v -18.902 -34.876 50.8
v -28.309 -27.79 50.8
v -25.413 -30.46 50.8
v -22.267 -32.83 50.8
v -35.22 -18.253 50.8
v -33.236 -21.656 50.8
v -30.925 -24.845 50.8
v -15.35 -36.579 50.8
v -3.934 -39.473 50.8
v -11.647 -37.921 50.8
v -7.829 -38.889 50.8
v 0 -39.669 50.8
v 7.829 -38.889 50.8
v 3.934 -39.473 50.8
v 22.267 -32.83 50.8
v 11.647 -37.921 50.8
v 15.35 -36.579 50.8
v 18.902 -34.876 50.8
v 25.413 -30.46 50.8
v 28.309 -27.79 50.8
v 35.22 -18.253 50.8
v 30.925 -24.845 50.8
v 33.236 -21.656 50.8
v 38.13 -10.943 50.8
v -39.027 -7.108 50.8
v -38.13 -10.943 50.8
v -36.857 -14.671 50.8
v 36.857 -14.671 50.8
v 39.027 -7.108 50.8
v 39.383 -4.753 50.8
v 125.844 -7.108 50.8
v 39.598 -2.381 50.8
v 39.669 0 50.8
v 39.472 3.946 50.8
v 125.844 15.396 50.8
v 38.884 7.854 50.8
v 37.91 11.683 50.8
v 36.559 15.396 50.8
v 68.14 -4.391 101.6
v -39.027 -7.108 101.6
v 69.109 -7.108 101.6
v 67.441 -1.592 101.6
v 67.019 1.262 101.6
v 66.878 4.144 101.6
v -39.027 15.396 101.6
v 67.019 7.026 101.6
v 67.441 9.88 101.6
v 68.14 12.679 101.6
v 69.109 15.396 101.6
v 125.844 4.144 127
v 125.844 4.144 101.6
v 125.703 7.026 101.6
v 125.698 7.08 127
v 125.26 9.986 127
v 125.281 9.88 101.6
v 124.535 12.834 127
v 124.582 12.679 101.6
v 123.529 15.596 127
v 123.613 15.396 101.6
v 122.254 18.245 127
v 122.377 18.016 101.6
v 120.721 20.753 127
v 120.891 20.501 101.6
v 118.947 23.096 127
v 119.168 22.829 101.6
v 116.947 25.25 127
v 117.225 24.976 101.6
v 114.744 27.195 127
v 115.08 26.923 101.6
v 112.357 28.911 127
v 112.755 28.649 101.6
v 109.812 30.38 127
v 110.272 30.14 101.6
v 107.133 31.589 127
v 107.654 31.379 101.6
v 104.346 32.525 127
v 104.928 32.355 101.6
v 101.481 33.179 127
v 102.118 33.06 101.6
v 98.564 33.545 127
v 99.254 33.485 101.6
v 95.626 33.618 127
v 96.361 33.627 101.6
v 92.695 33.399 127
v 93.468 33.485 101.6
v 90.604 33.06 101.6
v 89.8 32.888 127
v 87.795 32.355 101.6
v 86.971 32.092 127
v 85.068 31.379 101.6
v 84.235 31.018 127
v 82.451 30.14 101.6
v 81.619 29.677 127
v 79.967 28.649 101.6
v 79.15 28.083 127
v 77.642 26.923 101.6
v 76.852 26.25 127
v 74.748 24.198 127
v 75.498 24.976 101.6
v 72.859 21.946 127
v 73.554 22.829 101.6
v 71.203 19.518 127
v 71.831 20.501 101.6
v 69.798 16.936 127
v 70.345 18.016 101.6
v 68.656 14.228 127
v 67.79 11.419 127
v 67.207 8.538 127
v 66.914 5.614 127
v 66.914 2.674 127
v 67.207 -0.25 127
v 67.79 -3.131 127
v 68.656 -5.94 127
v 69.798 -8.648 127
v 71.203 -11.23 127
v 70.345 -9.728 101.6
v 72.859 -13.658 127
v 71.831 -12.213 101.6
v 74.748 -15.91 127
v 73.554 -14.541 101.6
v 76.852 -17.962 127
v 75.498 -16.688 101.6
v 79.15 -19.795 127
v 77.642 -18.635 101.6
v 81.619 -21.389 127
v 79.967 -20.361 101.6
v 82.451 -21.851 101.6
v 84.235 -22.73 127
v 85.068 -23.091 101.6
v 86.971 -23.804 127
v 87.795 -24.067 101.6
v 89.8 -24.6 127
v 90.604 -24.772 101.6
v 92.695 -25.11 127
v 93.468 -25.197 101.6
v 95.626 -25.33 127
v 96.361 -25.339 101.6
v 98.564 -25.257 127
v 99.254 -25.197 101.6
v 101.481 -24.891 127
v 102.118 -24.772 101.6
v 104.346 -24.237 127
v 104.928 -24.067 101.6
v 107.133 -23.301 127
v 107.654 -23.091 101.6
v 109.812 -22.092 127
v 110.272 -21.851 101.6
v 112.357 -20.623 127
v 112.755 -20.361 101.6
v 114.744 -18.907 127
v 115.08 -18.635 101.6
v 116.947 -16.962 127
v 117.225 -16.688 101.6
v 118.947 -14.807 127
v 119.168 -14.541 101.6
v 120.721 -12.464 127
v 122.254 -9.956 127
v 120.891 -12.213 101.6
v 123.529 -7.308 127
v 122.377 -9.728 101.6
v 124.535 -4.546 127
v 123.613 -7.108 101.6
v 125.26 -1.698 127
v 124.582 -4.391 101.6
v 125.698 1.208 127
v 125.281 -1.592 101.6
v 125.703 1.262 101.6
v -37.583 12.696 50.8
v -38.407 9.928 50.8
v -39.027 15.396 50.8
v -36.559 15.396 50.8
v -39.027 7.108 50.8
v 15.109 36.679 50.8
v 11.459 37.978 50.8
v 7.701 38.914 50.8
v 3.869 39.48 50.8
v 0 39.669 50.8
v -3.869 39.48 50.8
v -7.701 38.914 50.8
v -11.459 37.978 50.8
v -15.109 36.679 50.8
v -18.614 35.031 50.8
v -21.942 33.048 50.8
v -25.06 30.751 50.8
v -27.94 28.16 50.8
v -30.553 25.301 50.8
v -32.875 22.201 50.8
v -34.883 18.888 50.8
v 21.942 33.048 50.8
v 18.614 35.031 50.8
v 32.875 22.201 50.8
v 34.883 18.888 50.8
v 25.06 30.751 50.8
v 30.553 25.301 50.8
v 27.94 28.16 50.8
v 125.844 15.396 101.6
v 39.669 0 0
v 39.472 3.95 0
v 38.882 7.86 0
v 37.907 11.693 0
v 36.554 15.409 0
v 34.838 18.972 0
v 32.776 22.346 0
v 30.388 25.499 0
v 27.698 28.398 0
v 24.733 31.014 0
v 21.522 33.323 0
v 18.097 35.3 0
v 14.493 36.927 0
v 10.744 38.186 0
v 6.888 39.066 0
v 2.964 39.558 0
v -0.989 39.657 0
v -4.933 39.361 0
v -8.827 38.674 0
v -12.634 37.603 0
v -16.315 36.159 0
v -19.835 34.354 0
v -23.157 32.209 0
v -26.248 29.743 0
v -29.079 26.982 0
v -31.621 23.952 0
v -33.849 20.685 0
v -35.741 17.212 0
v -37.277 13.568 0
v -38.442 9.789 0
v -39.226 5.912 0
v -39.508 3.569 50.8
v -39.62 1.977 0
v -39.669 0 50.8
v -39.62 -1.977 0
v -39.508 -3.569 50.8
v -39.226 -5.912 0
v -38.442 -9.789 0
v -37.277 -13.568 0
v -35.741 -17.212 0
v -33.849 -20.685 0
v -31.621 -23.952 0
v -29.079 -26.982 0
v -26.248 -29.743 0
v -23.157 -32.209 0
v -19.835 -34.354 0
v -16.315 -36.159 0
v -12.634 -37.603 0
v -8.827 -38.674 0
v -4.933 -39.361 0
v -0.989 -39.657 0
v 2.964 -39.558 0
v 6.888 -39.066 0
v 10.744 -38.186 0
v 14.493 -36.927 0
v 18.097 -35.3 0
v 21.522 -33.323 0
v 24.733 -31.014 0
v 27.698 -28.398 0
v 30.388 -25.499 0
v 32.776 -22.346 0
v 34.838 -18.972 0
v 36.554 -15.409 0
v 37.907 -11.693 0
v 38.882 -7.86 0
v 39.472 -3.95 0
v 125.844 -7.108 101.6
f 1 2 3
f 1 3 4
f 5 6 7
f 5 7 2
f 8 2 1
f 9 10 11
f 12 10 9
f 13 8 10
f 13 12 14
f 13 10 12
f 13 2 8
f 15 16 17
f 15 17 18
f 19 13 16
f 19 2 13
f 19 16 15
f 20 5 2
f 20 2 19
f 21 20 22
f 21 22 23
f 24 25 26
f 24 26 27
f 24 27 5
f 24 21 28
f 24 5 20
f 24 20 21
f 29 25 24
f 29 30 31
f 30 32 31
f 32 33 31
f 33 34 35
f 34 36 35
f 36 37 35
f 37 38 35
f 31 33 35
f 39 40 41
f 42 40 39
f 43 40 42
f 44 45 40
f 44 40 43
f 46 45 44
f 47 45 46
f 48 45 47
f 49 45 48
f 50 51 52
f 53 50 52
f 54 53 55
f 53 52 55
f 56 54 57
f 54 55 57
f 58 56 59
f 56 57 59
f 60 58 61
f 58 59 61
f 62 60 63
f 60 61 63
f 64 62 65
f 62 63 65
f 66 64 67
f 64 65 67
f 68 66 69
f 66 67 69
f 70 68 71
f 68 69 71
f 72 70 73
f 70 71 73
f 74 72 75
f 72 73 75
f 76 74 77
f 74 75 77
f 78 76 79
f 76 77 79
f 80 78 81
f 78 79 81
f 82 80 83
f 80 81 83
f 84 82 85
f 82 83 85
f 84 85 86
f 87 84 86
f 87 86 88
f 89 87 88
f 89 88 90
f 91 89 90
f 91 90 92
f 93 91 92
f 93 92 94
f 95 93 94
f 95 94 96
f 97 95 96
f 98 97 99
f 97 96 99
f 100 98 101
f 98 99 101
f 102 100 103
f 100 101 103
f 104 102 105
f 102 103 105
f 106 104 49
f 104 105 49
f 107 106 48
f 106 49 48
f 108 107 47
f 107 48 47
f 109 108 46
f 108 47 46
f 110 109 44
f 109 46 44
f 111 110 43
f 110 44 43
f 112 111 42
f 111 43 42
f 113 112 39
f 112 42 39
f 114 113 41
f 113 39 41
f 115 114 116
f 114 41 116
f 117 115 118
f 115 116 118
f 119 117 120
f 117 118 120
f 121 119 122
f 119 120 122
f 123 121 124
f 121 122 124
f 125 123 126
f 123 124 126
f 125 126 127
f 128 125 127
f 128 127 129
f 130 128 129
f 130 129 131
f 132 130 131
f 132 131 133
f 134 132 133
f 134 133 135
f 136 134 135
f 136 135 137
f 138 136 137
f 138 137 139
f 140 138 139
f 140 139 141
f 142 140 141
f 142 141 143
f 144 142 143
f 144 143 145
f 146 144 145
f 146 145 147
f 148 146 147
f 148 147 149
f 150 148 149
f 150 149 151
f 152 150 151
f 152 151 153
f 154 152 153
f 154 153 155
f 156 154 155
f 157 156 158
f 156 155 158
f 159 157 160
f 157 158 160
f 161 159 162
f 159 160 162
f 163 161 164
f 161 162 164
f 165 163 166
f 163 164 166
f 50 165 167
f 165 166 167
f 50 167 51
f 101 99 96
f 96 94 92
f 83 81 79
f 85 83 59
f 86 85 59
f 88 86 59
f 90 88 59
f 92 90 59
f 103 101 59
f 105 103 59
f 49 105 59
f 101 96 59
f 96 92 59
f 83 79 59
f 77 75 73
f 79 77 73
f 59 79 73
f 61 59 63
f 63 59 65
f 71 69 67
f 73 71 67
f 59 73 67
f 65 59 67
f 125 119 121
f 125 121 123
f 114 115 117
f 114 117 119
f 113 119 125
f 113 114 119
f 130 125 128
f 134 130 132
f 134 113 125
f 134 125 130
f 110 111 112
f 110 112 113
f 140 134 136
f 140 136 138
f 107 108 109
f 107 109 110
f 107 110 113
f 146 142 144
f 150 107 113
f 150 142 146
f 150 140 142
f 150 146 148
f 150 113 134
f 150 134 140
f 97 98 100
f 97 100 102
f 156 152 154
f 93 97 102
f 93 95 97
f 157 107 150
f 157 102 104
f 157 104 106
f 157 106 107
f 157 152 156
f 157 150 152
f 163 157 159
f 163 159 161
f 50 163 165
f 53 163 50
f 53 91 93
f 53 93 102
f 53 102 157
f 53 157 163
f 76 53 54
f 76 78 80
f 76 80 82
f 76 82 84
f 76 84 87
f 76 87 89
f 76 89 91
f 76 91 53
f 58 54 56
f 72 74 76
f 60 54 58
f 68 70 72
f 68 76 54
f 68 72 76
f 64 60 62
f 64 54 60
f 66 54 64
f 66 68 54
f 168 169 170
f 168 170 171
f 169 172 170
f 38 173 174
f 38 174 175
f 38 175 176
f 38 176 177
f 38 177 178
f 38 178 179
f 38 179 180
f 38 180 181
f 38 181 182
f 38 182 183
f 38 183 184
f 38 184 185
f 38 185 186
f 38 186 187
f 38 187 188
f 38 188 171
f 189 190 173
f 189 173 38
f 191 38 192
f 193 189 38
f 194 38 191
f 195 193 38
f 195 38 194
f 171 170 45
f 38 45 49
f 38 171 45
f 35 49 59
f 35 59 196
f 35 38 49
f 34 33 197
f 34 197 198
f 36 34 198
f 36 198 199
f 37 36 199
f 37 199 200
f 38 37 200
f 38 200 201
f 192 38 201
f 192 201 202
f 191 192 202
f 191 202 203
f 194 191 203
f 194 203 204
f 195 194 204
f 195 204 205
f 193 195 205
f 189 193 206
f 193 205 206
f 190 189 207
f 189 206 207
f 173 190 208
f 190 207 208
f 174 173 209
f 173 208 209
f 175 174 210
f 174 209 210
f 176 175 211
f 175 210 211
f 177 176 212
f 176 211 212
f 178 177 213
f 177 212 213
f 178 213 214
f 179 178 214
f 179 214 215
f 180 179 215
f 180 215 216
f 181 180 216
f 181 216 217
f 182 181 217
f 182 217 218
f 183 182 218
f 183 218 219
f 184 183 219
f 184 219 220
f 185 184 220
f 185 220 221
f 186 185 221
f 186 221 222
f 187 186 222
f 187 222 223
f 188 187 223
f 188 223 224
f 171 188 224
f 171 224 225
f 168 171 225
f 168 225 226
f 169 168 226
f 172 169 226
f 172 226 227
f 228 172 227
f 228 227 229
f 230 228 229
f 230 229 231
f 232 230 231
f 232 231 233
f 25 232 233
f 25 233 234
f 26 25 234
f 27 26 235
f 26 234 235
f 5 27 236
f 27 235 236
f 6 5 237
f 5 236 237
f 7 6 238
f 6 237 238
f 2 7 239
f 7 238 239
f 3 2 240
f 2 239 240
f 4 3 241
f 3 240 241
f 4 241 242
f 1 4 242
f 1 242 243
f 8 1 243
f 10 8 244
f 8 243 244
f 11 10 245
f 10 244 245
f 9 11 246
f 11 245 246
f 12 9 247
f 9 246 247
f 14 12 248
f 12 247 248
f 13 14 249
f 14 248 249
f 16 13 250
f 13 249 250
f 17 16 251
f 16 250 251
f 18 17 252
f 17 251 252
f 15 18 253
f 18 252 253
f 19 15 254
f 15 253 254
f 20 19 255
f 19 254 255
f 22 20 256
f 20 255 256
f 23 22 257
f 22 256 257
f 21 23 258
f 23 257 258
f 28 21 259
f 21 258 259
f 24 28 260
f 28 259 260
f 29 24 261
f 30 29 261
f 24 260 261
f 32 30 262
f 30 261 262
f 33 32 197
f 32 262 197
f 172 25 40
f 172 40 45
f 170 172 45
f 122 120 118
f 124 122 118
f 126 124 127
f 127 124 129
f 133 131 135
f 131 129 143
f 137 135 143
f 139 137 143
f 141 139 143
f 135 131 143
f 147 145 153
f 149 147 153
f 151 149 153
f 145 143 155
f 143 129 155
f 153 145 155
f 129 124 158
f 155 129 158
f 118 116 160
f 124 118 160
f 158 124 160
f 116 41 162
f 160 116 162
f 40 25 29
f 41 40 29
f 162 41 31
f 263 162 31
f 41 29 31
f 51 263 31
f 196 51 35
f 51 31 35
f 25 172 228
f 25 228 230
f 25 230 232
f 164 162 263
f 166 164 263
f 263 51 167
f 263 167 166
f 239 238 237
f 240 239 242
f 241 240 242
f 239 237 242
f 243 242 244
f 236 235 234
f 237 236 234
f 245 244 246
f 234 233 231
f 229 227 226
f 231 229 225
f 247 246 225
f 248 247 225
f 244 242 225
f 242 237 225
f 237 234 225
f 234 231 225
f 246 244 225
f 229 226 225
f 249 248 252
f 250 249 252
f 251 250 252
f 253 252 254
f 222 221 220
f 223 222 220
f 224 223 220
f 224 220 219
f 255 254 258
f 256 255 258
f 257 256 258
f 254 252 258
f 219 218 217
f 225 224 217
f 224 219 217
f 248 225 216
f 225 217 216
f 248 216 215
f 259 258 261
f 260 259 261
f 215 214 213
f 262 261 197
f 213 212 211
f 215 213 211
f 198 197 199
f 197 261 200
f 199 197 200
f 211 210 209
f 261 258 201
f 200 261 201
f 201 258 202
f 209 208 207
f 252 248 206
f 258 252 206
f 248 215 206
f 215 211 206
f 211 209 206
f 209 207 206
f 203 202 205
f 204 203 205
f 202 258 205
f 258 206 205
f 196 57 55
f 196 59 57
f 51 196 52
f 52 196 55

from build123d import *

# Parameters (mm, degrees)
F0_R     = 39.669031
F1_DEPTH = 50.8
F2_W     = 164.8714
F2_H     = 22.5044
F3_DEPTH = 50.8
F4_R     = 29.483295
F5_DEPTH = 25.4


with BuildPart() as f1:
    # F0 (on Top) → F1 (new body)
    with BuildSketch(Plane.XY):
        Circle(F0_R)
    extrude(amount=F1_DEPTH)

    # F2 (on face) → F3 (join)
    with BuildSketch(Plane.XY.offset(50.8)):
        with Locations((43.408703, 4.14407)):
            Rectangle(F2_W, F2_H)
    extrude(amount=F3_DEPTH)

    # F4 (on face) → F5 (join)
    with BuildSketch(Plane.XY.offset(101.6)):
        with Locations((96.361108, 4.14407)):
            Circle(F4_R)
    extrude(amount=F5_DEPTH)


solid = f1.part
